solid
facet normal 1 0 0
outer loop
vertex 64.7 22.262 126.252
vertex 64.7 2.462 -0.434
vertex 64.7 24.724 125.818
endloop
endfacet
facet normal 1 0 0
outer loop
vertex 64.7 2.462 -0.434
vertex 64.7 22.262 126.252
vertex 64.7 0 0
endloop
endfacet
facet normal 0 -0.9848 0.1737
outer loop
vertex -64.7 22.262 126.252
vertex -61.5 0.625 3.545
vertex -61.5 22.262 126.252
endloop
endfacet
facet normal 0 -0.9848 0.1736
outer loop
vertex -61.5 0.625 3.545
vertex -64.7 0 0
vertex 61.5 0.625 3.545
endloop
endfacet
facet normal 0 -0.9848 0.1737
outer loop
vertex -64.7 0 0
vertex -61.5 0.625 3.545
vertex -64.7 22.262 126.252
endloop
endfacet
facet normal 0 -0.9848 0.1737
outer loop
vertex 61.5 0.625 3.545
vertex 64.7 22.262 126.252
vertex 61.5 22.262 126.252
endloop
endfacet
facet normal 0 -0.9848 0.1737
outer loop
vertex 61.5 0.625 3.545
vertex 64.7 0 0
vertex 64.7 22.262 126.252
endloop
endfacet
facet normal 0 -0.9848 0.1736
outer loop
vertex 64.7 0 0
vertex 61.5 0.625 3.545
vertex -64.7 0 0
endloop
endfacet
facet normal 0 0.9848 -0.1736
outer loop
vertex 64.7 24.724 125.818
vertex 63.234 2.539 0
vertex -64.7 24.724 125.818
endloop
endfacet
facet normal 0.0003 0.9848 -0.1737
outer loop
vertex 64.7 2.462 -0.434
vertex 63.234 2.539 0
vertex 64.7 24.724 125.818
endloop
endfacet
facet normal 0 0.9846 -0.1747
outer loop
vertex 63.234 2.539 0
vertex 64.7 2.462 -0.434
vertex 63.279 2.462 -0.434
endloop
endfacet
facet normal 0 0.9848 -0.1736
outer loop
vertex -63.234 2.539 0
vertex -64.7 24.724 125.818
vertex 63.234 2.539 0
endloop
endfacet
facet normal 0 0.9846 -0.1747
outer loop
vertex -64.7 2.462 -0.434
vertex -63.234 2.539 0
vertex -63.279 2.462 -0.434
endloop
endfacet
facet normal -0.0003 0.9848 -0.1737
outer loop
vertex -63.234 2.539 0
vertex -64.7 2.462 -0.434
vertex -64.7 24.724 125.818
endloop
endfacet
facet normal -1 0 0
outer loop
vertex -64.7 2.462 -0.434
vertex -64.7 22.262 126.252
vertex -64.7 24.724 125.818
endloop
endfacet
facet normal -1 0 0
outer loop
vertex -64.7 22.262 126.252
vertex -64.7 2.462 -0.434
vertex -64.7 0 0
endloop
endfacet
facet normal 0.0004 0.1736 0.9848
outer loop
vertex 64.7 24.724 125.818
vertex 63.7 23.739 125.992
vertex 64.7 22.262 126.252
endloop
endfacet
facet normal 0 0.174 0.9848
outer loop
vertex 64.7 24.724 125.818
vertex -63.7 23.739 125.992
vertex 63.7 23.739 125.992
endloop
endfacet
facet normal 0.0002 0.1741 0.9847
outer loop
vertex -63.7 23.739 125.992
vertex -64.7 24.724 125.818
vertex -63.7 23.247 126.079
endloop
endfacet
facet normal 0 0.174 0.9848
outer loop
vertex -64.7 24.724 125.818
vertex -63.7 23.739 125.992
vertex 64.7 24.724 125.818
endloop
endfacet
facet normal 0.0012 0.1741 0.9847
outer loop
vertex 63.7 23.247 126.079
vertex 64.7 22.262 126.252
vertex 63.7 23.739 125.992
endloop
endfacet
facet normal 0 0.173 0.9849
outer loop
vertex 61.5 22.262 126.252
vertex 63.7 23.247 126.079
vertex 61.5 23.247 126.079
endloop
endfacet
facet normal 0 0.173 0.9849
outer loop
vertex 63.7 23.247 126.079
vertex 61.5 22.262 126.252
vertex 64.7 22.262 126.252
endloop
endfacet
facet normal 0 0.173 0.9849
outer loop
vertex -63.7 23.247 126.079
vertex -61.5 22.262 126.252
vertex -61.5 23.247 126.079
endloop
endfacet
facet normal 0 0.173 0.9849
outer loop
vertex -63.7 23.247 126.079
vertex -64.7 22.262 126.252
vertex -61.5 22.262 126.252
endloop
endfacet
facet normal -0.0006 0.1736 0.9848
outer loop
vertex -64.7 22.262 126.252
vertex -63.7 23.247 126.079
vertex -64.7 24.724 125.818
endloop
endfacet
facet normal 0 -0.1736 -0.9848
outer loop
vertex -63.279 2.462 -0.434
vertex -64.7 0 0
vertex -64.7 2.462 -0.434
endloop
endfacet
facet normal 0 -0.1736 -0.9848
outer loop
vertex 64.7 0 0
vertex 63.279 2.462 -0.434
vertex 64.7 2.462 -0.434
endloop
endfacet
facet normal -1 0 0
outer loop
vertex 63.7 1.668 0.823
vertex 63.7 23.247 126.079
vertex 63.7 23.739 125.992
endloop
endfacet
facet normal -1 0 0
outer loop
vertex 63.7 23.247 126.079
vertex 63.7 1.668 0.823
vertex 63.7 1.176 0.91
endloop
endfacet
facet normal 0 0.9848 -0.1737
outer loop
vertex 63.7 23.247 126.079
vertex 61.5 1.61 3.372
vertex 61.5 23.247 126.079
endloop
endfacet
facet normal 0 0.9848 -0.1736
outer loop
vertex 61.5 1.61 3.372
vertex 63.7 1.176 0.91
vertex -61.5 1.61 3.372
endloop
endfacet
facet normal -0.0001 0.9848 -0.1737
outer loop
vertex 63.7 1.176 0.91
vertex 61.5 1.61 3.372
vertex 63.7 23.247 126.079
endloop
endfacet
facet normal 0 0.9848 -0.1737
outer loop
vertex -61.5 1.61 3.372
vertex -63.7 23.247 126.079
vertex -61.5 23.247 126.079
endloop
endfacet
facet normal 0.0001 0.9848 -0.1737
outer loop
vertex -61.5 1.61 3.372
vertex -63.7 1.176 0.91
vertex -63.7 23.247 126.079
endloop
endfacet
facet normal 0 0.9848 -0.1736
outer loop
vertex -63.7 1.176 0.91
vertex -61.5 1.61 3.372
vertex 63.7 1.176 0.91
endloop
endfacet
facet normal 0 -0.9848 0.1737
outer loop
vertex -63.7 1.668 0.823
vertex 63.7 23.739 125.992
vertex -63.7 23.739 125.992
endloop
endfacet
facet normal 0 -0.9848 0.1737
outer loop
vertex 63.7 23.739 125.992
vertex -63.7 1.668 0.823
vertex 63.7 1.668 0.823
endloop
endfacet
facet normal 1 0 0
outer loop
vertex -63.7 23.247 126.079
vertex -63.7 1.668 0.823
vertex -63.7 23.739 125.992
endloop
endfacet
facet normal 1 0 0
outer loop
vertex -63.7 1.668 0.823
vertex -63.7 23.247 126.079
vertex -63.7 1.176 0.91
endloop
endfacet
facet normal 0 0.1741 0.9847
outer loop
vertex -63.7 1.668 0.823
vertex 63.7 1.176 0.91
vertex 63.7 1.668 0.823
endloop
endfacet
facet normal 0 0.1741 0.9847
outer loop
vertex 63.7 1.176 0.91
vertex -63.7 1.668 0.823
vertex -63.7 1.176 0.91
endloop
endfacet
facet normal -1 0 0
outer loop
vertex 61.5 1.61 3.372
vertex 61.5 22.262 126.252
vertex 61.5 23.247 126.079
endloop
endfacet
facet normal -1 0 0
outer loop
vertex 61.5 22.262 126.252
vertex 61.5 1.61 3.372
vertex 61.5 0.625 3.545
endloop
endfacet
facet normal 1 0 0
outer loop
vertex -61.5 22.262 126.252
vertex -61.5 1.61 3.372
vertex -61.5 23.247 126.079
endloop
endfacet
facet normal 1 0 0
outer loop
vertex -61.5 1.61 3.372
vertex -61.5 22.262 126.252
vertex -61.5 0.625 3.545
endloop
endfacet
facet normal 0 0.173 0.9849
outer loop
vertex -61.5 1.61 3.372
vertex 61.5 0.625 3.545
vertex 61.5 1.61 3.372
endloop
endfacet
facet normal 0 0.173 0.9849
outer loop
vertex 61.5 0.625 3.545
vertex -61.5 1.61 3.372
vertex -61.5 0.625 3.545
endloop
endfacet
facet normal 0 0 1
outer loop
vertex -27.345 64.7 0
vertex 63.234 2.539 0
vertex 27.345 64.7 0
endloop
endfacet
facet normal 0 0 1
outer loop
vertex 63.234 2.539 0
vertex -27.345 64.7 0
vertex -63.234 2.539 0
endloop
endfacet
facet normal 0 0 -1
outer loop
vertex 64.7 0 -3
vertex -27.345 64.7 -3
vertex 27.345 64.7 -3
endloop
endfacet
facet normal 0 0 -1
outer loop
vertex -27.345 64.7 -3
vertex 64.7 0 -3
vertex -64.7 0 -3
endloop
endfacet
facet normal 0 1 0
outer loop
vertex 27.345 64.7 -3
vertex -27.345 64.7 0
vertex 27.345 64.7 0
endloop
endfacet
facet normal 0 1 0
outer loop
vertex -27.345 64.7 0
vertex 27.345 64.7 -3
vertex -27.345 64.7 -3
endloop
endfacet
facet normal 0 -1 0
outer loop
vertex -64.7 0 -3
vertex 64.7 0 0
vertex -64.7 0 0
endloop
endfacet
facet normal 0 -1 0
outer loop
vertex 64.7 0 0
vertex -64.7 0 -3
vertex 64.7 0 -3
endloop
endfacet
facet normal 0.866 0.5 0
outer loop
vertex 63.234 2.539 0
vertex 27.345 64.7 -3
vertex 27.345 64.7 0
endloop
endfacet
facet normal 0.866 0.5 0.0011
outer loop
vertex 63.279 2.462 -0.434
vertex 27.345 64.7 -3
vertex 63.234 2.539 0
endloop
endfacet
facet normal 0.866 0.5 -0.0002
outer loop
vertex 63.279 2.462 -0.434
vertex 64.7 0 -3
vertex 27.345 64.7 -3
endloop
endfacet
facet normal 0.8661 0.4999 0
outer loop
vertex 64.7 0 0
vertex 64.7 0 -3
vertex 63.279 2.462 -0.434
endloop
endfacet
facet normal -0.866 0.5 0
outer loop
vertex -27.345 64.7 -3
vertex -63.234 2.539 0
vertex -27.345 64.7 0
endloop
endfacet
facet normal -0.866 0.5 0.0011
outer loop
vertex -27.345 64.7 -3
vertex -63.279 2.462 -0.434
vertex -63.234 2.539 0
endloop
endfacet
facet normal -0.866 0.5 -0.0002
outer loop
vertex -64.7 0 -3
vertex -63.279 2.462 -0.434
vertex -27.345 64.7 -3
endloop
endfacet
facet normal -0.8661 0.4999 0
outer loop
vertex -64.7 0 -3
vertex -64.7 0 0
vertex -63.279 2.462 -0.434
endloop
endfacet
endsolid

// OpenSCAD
photo_width = 5*25.4;
photo_height = 5*25.4;

photo_angle = 80;

edge = 1;
slot_thickness = 0.5;
overlap = 2;

tolerance = 0.2;

frame_width = photo_width + 2 * edge + 2 * tolerance;
frame_height = photo_height + edge + tolerance;
frame_thickness = 2*edge + slot_thickness;

slot_width = photo_width + 2 * tolerance;
slot_height = photo_height + tolerance;

view_width = photo_width - 2 * overlap;
view_height = photo_height - overlap;
view_thickness = edge + 0.1;

base_thickness = 3;

union() {
  rotate([photo_angle, 0, 0])
  translate([0, frame_height / 2, -frame_thickness/2])
  difference () {
    cube([frame_width, frame_height, frame_thickness], center = true);
    translate([0, (edge + tolerance) / 2, 0])
      cube([slot_width, slot_height, slot_thickness], center = true);
    translate([0, overlap, (view_thickness + slot_thickness) / 2])
      cube([view_width, view_height, view_thickness], center = true);
  };
  
  // stand
  translate([0, frame_width / 4, -base_thickness / 2])
  difference () {
    cube([frame_width, frame_width/2, base_thickness], center = true);

    translate([frame_width / 2, - frame_width / 4, -base_thickness/2 - 0.1])
    rotate([0, 0, 30])
      cube([2 * frame_width, 2 * frame_width, base_thickness + 0.2]);

    translate([-frame_width / 2, -frame_width / 4, base_thickness/2+0.1])
    rotate([0, 180, -30])
      cube([2 * frame_width, 2 * frame_width, base_thickness + 0.2]);

  };
};
